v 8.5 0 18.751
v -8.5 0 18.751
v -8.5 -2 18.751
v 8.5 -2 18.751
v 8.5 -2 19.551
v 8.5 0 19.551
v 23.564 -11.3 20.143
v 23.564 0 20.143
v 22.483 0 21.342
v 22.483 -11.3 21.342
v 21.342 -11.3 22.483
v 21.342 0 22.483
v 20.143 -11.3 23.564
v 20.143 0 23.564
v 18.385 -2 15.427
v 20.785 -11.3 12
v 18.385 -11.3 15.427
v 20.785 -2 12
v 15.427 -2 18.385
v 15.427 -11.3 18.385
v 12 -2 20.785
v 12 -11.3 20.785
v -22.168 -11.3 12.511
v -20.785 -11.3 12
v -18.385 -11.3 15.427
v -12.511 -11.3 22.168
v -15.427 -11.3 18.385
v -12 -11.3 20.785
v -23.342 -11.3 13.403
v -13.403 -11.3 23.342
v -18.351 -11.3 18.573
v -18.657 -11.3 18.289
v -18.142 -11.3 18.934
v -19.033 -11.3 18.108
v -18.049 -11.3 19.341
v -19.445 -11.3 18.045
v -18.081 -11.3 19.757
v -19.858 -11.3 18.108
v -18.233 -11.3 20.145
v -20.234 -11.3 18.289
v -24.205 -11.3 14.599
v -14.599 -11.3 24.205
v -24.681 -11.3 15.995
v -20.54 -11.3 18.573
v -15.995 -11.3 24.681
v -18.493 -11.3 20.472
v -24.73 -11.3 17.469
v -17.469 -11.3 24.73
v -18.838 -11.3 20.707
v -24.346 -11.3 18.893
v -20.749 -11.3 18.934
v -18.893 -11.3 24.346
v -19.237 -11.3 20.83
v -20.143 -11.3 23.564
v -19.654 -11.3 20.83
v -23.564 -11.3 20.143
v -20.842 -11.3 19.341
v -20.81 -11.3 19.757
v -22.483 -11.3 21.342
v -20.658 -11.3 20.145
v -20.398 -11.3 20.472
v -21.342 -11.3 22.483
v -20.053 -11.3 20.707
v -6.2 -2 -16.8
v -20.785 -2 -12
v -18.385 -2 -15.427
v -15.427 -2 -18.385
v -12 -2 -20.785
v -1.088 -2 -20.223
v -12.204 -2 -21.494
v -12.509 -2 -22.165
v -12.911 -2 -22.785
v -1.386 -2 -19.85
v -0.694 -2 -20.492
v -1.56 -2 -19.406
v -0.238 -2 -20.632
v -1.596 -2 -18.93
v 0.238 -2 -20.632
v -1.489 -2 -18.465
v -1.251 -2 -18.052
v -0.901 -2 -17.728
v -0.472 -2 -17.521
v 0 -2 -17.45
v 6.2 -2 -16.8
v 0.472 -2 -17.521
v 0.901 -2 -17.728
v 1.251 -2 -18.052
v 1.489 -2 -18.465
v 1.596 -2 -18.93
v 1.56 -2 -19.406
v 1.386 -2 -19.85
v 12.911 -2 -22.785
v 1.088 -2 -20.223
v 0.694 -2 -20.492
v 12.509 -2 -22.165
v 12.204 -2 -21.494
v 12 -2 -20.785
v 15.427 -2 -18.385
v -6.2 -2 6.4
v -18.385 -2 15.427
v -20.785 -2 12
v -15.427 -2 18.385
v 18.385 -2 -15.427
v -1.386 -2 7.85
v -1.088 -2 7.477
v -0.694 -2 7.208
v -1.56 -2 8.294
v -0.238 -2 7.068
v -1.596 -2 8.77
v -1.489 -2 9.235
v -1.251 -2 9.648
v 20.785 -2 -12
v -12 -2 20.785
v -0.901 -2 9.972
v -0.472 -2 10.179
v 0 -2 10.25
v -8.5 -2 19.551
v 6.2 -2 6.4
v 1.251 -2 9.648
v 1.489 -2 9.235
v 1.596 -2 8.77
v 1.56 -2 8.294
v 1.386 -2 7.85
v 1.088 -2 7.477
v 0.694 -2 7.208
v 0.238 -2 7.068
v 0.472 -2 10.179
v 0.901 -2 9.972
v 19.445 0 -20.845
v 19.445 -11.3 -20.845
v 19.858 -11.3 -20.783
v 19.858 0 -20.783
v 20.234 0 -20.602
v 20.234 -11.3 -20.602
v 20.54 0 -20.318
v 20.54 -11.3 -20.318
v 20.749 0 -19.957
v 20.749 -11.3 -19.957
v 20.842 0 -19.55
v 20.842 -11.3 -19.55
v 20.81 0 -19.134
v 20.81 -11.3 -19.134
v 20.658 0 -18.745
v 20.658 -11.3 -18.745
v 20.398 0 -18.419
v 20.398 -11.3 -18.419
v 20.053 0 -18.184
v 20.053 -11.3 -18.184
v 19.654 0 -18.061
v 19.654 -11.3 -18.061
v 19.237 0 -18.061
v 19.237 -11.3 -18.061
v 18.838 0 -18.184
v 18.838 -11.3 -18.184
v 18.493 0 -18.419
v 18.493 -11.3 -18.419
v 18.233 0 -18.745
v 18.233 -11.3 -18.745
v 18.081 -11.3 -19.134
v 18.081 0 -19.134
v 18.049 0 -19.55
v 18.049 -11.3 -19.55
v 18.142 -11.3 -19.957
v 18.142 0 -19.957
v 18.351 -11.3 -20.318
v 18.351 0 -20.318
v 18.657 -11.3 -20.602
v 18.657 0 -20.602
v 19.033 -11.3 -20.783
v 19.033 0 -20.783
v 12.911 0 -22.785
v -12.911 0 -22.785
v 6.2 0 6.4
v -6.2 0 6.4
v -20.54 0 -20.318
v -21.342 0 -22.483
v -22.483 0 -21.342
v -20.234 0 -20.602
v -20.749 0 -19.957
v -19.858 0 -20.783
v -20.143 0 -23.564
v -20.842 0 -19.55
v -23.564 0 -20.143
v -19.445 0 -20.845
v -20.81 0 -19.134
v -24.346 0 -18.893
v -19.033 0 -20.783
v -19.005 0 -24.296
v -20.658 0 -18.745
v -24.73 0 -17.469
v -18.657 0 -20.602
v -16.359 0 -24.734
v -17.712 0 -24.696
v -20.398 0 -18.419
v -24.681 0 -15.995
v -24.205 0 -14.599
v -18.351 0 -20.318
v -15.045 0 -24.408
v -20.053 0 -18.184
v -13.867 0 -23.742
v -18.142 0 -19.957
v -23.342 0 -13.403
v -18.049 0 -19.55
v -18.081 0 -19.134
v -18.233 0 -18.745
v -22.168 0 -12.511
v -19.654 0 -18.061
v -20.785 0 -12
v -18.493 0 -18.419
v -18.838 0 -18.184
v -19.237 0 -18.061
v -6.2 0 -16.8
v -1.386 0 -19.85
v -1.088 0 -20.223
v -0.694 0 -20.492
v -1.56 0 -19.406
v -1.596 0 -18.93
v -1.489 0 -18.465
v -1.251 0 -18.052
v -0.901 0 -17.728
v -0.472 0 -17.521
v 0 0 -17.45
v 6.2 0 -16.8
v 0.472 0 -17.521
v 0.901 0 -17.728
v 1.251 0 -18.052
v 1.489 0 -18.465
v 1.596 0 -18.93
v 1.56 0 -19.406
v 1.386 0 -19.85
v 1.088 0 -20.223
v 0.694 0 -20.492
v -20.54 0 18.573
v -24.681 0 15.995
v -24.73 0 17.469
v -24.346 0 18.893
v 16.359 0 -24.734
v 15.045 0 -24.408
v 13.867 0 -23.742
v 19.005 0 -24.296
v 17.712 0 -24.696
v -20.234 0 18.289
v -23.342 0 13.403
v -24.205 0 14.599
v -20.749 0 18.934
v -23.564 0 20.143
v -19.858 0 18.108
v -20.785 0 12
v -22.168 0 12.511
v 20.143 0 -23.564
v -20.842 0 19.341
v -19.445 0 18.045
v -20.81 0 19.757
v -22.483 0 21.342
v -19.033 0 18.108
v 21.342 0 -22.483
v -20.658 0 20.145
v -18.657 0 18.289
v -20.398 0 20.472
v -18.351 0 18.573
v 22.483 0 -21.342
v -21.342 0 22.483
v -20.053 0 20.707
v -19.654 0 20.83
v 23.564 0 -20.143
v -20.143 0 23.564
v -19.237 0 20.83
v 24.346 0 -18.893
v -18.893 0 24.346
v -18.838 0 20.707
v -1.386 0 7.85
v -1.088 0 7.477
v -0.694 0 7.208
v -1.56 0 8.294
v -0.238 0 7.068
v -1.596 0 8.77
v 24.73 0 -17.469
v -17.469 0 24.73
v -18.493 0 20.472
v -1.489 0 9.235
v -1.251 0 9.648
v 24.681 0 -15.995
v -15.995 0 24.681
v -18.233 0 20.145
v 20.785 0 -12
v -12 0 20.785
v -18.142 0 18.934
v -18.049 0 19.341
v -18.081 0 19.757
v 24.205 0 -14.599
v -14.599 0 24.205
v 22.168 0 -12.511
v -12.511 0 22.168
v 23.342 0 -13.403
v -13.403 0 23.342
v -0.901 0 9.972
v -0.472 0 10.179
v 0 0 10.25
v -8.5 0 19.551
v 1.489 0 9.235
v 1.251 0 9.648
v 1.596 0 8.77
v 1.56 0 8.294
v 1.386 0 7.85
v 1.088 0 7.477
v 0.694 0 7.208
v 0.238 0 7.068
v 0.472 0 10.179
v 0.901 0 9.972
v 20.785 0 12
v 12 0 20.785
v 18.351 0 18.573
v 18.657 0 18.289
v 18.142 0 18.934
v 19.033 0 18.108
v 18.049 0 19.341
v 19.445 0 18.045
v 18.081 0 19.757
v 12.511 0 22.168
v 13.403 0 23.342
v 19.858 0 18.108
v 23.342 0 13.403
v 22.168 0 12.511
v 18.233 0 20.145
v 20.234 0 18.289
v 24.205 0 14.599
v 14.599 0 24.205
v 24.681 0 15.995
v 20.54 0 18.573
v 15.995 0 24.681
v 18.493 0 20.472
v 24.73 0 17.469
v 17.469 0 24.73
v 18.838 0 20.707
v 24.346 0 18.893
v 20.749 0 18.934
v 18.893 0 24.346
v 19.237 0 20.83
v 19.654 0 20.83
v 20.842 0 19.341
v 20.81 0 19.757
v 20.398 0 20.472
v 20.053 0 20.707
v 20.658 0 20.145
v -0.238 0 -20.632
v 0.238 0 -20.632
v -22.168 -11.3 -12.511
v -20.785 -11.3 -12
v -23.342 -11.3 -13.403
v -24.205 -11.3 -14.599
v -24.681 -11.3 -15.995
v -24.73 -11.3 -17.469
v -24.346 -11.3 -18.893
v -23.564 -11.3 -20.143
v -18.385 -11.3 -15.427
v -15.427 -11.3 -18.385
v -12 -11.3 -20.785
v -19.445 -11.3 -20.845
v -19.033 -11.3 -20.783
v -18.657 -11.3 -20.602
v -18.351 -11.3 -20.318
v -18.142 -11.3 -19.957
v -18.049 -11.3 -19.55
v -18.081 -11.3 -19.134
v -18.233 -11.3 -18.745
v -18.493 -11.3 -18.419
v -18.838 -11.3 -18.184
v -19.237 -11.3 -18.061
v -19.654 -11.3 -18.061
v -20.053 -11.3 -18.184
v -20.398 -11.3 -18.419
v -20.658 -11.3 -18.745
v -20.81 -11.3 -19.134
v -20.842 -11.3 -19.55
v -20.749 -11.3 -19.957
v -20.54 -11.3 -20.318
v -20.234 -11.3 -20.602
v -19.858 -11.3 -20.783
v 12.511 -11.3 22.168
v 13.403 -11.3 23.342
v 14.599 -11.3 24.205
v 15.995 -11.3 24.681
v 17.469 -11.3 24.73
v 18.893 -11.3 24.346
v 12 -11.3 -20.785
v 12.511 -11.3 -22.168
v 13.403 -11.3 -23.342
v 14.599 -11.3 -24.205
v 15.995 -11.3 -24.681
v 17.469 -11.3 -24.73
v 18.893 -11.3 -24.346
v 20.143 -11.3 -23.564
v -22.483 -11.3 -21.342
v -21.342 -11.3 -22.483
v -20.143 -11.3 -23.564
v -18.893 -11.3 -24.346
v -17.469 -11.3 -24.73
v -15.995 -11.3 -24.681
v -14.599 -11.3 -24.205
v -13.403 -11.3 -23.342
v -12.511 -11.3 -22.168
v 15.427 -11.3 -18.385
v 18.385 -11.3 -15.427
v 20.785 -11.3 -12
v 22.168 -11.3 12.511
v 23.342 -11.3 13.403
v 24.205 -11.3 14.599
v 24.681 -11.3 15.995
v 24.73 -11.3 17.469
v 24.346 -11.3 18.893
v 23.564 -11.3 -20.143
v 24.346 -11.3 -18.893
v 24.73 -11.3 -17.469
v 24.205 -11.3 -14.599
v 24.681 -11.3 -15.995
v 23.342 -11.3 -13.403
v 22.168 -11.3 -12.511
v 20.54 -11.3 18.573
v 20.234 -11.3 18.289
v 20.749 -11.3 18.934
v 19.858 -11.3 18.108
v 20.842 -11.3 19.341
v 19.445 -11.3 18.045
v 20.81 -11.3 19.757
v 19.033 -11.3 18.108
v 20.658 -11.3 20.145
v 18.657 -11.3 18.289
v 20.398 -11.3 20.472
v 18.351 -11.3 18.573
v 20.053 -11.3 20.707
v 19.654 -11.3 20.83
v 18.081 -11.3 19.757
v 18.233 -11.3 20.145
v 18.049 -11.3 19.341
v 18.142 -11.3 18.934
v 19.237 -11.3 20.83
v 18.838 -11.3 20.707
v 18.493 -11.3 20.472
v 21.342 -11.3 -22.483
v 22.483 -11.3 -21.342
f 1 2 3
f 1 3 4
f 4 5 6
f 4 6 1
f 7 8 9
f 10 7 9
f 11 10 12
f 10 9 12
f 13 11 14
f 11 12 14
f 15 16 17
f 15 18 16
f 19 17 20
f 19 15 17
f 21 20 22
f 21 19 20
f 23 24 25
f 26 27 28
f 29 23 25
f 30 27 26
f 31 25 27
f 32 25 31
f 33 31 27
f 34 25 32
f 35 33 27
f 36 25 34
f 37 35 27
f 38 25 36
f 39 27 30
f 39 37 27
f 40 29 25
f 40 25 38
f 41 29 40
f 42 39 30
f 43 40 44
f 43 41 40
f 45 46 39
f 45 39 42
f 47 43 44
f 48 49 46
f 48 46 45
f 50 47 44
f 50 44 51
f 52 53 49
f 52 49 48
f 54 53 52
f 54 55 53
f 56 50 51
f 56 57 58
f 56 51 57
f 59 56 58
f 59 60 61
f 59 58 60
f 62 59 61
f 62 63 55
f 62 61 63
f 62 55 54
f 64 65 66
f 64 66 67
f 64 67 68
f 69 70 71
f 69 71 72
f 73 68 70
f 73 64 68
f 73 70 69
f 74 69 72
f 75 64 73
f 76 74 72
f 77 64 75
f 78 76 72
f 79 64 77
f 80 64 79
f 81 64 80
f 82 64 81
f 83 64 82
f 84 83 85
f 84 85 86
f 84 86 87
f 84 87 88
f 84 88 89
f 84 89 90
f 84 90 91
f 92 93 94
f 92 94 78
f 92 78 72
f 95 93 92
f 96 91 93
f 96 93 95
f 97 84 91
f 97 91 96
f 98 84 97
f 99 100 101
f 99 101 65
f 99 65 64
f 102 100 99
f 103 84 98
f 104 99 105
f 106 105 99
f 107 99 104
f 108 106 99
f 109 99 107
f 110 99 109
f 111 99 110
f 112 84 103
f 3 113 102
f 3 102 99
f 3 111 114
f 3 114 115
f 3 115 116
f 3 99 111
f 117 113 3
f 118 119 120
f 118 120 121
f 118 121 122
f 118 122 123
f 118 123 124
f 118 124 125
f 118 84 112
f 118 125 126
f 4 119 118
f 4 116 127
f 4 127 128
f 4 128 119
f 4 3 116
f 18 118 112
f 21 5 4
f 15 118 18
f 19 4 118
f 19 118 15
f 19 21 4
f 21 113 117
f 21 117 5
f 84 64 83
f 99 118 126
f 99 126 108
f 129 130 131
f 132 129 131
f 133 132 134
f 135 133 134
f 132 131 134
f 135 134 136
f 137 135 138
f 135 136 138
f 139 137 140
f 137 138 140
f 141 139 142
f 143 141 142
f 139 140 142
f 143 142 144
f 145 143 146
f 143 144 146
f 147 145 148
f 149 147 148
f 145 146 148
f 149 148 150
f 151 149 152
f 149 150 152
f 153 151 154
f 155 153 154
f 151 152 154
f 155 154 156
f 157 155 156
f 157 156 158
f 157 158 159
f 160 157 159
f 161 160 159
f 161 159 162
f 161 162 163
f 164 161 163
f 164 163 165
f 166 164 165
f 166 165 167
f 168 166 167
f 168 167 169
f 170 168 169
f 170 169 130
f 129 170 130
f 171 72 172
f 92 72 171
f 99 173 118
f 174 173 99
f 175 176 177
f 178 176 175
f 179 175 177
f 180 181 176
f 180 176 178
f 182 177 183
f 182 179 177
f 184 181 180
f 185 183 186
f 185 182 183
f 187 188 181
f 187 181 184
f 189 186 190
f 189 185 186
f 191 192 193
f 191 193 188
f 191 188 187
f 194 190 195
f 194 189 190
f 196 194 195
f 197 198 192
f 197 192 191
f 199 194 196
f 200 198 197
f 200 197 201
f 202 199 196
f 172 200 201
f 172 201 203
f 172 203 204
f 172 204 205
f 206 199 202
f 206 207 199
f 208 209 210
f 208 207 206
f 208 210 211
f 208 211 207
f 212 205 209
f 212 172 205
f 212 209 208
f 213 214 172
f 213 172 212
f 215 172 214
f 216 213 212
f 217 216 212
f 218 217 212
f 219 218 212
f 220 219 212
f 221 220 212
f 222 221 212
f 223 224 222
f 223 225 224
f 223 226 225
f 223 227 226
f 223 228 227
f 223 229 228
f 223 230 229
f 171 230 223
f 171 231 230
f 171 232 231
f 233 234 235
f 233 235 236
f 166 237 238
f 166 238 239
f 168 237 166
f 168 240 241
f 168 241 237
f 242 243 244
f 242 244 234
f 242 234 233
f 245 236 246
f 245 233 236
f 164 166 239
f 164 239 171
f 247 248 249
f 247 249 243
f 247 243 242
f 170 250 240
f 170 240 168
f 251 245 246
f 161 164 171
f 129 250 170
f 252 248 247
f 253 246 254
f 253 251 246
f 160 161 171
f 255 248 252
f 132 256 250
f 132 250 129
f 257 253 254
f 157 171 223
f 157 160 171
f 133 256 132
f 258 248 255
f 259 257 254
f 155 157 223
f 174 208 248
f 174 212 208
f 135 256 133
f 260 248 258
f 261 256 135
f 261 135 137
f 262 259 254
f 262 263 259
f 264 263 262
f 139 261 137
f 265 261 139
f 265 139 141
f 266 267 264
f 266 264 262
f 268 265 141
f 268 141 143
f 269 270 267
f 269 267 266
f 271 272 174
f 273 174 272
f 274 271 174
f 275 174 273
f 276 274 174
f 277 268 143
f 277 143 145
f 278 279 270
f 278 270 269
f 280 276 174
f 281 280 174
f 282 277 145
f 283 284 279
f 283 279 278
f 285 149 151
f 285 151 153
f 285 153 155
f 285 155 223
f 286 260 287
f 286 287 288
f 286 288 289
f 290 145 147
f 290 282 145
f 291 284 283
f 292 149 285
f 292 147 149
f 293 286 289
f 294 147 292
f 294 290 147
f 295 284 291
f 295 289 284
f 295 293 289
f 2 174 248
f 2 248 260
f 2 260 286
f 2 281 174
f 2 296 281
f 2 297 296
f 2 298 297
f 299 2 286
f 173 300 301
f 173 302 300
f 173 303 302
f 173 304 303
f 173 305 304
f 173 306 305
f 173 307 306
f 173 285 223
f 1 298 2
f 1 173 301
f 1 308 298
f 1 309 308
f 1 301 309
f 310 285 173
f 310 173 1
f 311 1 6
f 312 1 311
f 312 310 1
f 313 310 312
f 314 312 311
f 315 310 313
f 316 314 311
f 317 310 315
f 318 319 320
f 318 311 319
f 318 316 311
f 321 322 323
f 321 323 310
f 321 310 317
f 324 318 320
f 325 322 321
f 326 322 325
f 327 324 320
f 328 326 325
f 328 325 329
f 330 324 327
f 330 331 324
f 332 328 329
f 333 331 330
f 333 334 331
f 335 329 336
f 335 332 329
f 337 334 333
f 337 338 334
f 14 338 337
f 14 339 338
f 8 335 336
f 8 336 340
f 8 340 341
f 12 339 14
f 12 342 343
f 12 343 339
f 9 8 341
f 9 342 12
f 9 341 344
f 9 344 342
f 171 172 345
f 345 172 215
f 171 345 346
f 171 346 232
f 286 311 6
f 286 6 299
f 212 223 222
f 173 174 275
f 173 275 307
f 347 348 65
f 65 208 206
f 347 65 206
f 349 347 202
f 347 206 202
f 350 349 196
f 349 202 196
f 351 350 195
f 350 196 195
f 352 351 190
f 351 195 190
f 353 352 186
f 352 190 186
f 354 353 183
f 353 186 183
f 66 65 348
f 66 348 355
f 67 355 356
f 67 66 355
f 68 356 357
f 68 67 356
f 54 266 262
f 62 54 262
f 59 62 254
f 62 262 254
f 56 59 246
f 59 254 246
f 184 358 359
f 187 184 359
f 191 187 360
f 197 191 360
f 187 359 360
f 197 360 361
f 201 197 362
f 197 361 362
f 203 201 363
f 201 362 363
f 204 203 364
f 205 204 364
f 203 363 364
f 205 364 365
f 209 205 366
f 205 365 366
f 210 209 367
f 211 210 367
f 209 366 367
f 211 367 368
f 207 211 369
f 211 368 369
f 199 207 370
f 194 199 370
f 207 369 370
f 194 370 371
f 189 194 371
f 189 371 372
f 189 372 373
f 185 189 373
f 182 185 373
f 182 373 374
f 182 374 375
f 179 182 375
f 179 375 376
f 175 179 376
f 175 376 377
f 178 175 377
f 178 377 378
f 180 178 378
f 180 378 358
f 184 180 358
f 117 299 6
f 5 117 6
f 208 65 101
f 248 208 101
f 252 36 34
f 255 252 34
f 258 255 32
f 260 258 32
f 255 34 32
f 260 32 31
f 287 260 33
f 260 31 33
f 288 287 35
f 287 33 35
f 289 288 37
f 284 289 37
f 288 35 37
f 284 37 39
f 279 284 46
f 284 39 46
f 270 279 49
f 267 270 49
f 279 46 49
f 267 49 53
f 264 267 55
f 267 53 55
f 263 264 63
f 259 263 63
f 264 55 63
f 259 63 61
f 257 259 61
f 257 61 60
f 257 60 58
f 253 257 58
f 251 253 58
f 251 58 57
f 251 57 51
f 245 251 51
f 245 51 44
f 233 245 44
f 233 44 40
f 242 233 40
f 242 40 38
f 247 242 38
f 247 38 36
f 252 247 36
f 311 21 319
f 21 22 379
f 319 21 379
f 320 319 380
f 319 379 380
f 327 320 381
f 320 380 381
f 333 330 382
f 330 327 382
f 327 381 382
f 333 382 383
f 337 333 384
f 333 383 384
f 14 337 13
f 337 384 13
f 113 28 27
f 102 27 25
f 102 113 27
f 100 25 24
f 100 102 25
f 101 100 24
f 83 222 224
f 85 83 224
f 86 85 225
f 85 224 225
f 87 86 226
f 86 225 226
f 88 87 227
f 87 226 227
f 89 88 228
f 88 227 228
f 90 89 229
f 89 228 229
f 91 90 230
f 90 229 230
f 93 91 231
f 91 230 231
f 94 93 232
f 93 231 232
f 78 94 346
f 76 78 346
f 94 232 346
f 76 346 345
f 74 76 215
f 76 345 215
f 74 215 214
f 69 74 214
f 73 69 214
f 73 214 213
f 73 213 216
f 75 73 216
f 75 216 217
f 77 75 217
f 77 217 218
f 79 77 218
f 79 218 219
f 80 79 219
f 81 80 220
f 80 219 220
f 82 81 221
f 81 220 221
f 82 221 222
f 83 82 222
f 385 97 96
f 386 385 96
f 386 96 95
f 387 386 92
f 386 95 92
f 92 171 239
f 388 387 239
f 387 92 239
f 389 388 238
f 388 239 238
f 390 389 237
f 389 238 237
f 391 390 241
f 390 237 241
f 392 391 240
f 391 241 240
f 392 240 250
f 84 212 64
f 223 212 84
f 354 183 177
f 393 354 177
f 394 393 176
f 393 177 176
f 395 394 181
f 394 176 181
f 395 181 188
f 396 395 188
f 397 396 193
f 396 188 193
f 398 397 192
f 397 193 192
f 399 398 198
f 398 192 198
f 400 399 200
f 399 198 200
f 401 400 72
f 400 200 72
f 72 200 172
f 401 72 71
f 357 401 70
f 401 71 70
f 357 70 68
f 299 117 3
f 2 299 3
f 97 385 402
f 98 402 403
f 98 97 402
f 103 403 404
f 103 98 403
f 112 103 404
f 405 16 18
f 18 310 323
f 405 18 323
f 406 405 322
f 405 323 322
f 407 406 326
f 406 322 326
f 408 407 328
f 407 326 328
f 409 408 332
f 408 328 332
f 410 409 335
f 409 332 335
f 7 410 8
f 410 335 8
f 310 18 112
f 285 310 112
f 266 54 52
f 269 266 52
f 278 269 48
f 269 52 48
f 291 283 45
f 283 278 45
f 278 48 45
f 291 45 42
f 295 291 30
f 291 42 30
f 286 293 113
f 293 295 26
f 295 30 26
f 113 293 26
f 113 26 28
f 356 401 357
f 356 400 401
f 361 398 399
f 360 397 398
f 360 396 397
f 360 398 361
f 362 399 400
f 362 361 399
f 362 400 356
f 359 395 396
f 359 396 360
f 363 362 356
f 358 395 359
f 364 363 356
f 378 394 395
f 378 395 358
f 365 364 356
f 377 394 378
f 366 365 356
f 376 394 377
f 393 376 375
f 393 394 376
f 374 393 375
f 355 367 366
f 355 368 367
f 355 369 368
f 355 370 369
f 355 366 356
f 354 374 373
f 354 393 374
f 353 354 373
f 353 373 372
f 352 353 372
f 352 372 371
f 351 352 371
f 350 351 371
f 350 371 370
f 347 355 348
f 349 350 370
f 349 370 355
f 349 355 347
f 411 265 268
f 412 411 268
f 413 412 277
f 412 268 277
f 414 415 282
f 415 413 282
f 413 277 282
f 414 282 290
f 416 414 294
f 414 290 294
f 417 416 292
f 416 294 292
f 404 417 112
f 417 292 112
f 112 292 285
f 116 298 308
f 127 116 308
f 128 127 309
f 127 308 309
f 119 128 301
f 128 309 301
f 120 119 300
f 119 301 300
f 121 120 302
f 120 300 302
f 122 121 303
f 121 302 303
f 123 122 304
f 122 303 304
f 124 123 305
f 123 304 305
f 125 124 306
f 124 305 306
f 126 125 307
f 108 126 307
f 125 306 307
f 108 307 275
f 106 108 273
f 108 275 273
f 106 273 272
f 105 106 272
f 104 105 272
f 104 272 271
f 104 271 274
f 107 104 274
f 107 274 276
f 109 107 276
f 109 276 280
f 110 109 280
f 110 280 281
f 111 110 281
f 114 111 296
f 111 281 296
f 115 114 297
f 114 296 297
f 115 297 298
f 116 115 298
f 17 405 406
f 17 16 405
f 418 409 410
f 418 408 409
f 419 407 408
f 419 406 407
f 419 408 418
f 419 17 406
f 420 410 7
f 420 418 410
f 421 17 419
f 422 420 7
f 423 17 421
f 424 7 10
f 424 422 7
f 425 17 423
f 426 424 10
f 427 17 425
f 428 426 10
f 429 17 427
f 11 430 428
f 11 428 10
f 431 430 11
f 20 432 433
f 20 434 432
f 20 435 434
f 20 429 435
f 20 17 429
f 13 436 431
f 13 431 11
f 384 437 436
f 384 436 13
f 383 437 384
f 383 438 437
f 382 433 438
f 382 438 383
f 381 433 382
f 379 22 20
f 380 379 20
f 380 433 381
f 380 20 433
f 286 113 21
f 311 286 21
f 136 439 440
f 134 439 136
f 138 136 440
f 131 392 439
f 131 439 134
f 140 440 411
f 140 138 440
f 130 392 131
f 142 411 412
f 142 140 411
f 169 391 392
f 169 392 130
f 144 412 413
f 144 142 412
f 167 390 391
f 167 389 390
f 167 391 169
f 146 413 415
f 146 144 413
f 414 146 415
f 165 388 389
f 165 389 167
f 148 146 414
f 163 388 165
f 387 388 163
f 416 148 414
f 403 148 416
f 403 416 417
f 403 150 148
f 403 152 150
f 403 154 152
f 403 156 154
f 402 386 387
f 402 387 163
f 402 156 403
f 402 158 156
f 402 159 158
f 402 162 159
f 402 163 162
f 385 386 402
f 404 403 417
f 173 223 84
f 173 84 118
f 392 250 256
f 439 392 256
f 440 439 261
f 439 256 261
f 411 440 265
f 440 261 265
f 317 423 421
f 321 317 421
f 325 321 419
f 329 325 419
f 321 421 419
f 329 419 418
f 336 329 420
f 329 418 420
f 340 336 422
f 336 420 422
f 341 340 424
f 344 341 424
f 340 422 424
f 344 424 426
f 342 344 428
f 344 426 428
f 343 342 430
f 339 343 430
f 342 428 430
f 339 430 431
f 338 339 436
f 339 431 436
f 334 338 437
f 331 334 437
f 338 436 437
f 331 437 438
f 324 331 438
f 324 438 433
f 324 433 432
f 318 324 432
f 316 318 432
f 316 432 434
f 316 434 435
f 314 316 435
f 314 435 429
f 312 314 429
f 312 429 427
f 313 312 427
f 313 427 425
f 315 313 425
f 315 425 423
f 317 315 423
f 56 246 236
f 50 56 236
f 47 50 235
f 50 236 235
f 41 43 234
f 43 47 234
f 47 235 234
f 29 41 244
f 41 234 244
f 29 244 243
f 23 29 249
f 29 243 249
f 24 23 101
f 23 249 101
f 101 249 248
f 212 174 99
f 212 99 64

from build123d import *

# Parameters (mm, degrees)
SKETCH3_R            = 31
SKETCH3_R_2          = 1.6
SERVO_MOUNT_DEPTH    = 2
SKETCH4_R            = 31
SKETCH4_R_2          = 24
SPACER_DEPTH         = 9.3
FLEX_CABLE_REACH     = 47.274
SKETCH5_W            = 17
SKETCH5_H            = 0.8
SKETCH7_W            = 24
SKETCH7_H            = 62
CUT_EXTRUDE3_DEPTH   = 45.816180114
SKETCH8_W            = 62
SKETCH8_H            = 24
CUT_EXTRUDE4_DEPTH   = 45.816180114
MOUNTING_HOLES_REACH = 47.274
SKETCH10_R           = 1.4
CUT_EXTRUDE5_REACH   = 46.816
FILLET2_R            = 5


with BuildPart() as part:
    # Sketch3 → Servo mount (new body)
    with BuildSketch(Plane(origin=(0, 0, 0), x_dir=(1, 0, 0), z_dir=(0, 1, 0))):
        with Locations(Location((0, 0, 0), (0, 0, 270))):
            Circle(SKETCH3_R)
        with Locations(Location((0, -8.65, 0), (0, 0, 270))):
            Circle(SKETCH3_R_2, mode=Mode.SUBTRACT)
        with Locations(Location((0, 19.05, 0), (0, 0, 270))):
            Circle(SKETCH3_R_2, mode=Mode.SUBTRACT)
        Polygon((-6.2, 16.1), (-6.2, 2.227105745), (-6.2, -6.4), (-5.7, -6.4), (5.7, -6.4), (6.2, -6.4), (6.2, 2.227105745), (6.2, 16.1), (6.2, 16.8), (5.7, 16.8), (-5.7, 16.8), (-6.2, 16.8), align=None, mode=Mode.SUBTRACT)
    extrude(amount=-SERVO_MOUNT_DEPTH)

    # Sketch4 → Spacer (add)
    with BuildSketch(Plane(origin=(0, -2, 0), x_dir=(-1, 0, 0), z_dir=(0, -1, 0))):
        with Locations(Location((0, 0, 0), (0, 0, 270))):
            Circle(SKETCH4_R)
        with Locations(Location((0, 0, 0), (0, 0, 270))):
            Circle(SKETCH4_R_2, mode=Mode.SUBTRACT)
    extrude(amount=SPACER_DEPTH)

    # Sketch5 → Flex cable (cut, up to next)
    with BuildSketch(Plane(origin=(0, 0, 0), x_dir=(1, 0, 0), z_dir=(0, 1, 0)), mode=Mode.PRIVATE) as flex_cable_sk1:
        with Locations((0, -19.15054858)):
            Rectangle(SKETCH5_W, SKETCH5_H)
    flex_cable_tool1 = extrude(flex_cable_sk1.sketch, amount=-FLEX_CABLE_REACH, mode=Mode.PRIVATE) & part.part
    add(flex_cable_tool1.solids().sort_by_distance((0, 0, 19.150549))[0], mode=Mode.SUBTRACT)

    # Sketch7 → Cut-Extrude3 (cut, through all)
    with BuildSketch(Plane.XZ.offset(2)):
        Rectangle(SKETCH7_W, SKETCH7_H)
    extrude(amount=CUT_EXTRUDE3_DEPTH, mode=Mode.SUBTRACT)

    # Sketch8 → Cut-Extrude4 (cut, through all)
    with BuildSketch(Plane.XZ.offset(2)):
        Rectangle(SKETCH8_W, SKETCH8_H)
    extrude(amount=CUT_EXTRUDE4_DEPTH, mode=Mode.SUBTRACT)

    # Sketch10 → Mounting holes (cut, up to next)
    with BuildSketch(Plane.XZ.offset(11.3), mode=Mode.PRIVATE) as mounting_holes_sk1:
        with Locations(Location((-19.445436483, -19.445436483, 0), (0, 0, 270))):
            Circle(SKETCH10_R)
    mounting_holes_tool1 = extrude(mounting_holes_sk1.sketch, amount=-MOUNTING_HOLES_REACH, mode=Mode.PRIVATE) & part.part
    # Sketch10 → Mounting holes (cut, up to next)
    with BuildSketch(Plane.XZ.offset(11.3), mode=Mode.PRIVATE) as mounting_holes_sk2:
        with Locations(Location((19.445436483, -19.445436483, 0), (0, 0, 270))):
            Circle(SKETCH10_R)
    mounting_holes_tool2 = extrude(mounting_holes_sk2.sketch, amount=-MOUNTING_HOLES_REACH, mode=Mode.PRIVATE) & part.part
    # Sketch10 → Mounting holes (cut, up to next)
    with BuildSketch(Plane.XZ.offset(11.3), mode=Mode.PRIVATE) as mounting_holes_sk3:
        with Locations(Location((-19.445436483, 19.445436483, 0), (0, 0, 270))):
            Circle(SKETCH10_R)
    mounting_holes_tool3 = extrude(mounting_holes_sk3.sketch, amount=-MOUNTING_HOLES_REACH, mode=Mode.PRIVATE) & part.part
    # Sketch10 → Mounting holes (cut, up to next)
    with BuildSketch(Plane.XZ.offset(11.3), mode=Mode.PRIVATE) as mounting_holes_sk4:
        with Locations(Location((19.445436483, 19.445436483, 0), (0, 0, 270))):
            Circle(SKETCH10_R)
    mounting_holes_tool4 = extrude(mounting_holes_sk4.sketch, amount=-MOUNTING_HOLES_REACH, mode=Mode.PRIVATE) & part.part
    add(mounting_holes_tool1.solids().sort_by_distance((-19.445436, -11.3, -19.445436))[0], mode=Mode.SUBTRACT)
    add(mounting_holes_tool2.solids().sort_by_distance((19.445436, -11.3, -19.445436))[0], mode=Mode.SUBTRACT)
    add(mounting_holes_tool3.solids().sort_by_distance((-19.445436, -11.3, 19.445436))[0], mode=Mode.SUBTRACT)
    add(mounting_holes_tool4.solids().sort_by_distance((19.445436, -11.3, 19.445436))[0], mode=Mode.SUBTRACT)

    # Sketch11 → Cut-Extrude5 (cut, up to next)
    with BuildSketch(Plane.XZ.offset(2), mode=Mode.PRIVATE) as cut_extrude5_sk1:
        with BuildLine():
            Line((-12, -22.784609691), (12, -22.784609691))
            Line((12, -22.784609691), (12, -28.583211856))
            ThreePointArc((12, -28.583211856), (0, -31), (-12, -28.583211856))
            Line((-12, -28.583211856), (-12, -22.784609691))
        make_face()
    cut_extrude5_tool1 = extrude(cut_extrude5_sk1.sketch, amount=-CUT_EXTRUDE5_REACH, mode=Mode.PRIVATE) & part.part
    # Sketch11 → Cut-Extrude5 (cut, up to next)
    with BuildSketch(Plane.XZ.offset(2), mode=Mode.PRIVATE) as cut_extrude5_sk2:
        with BuildLine():
            Line((28.583211856, 12), (20.784609691, 12))
            Line((20.784609691, 12), (20.784609691, -12))
            Line((20.784609691, -12), (28.583211856, -12))
            ThreePointArc((28.583211856, -12), (31, 0), (28.583211856, 12))
        make_face()
    cut_extrude5_tool2 = extrude(cut_extrude5_sk2.sketch, amount=-CUT_EXTRUDE5_REACH, mode=Mode.PRIVATE) & part.part
    # Sketch11 → Cut-Extrude5 (cut, up to next)
    with BuildSketch(Plane.XZ.offset(2), mode=Mode.PRIVATE) as cut_extrude5_sk3:
        with BuildLine():
            Line((-28.583211856, -12), (-20.784609691, -12))
            Line((-20.784609691, -12), (-20.784609691, 12))
            Line((-20.784609691, 12), (-28.583211856, 12))
            ThreePointArc((-28.583211856, 12), (-31, 0), (-28.583211856, -12))
        make_face()
    cut_extrude5_tool3 = extrude(cut_extrude5_sk3.sketch, amount=-CUT_EXTRUDE5_REACH, mode=Mode.PRIVATE) & part.part
    # Sketch11 → Cut-Extrude5 (cut, up to next)
    with BuildSketch(Plane.XZ.offset(2), mode=Mode.PRIVATE) as cut_extrude5_sk4:
        with BuildLine():
            Line((12, 20.784609691), (12, 28.583211856))
            ThreePointArc((12, 28.583211856), (0, 31), (-12, 28.583211856))
            Line((-12, 28.583211856), (-12, 20.784609691))
            Line((-12, 20.784609691), (12, 20.784609691))
        make_face()
    cut_extrude5_tool4 = extrude(cut_extrude5_sk4.sketch, amount=-CUT_EXTRUDE5_REACH, mode=Mode.PRIVATE) & part.part
    add(cut_extrude5_tool1.solids().sort_by_distance((0, -2, -26.530561))[0], mode=Mode.SUBTRACT)
    add(cut_extrude5_tool2.solids().sort_by_distance((25.523226, -2, 0))[0], mode=Mode.SUBTRACT)
    add(cut_extrude5_tool3.solids().sort_by_distance((-25.523226, -2, 0))[0], mode=Mode.SUBTRACT)
    add(cut_extrude5_tool4.solids().sort_by_distance((0, -2, 25.523226))[0], mode=Mode.SUBTRACT)

    # Fillet2
    # the kernel refuses this fillet: 5 mm, written as the material it takes off along each edge
    with BuildSketch(Plane(origin=(12, -35.215595033, 28.583211856), x_dir=(0.8512708603213988, -2.9625112876132807e-14, -0.5247265215020731), z_dir=(0, 1, 0))) as fillet2_piece_1:
        with BuildLine():
            CenterArc((8.794767206, 4.940124775), FILLET2_R, 160.140208495, 118.735653745)
            Line((4.092133387, 6.638722774), (0, 0))
            ThreePointArc((0, 0), (4.783119007, -0.371226395), (9.566238013, 0))
        make_face()
    extrude(amount=59.131190067, mode=Mode.SUBTRACT)
    with BuildSketch(Plane(origin=(12, 23.915595033, -28.583211856), x_dir=(0, 0, 1), z_dir=(0, -1, 0))) as fillet2_piece_2_section:
        with BuildLine():
            CenterArc((8.820231871, -4.894514557), FILLET2_R, 101.790043136, 118.735653745)
            ThreePointArc((5.019658797, -8.143459664), (2.193815186, -4.266522167), (0, 0))
            Line((0, 0), (7.798602165, 0))
        make_face()
    fillet2_piece_2 = extrude(amount=59.131190067, mode=Mode.PRIVATE)
    fillet2_piece_2 = split(fillet2_piece_2, bisect_by=Plane(origin=(16.358047436, -1, -22.784609691), z_dir=(0, 0, -1)), keep=Keep.TOP, mode=Mode.PRIVATE)
    add(fillet2_piece_2, mode=Mode.SUBTRACT)
    with BuildSketch(Plane(origin=(12, 23.915595033, -28.583211856), x_dir=(0, 0, 1), z_dir=(0, -1, 0))) as fillet2_piece_3_section:
        with BuildLine():
            CenterArc((8.820231871, -4.894514557), FILLET2_R, 101.790043136, 118.735653745)
            ThreePointArc((5.019658797, -8.143459664), (2.193815186, -4.266522167), (0, 0))
            Line((0, 0), (7.798602165, 0))
        make_face()
    fillet2_piece_3 = extrude(amount=59.131190067, mode=Mode.PRIVATE)
    fillet2_piece_3 = split(fillet2_piece_3, bisect_by=Plane(origin=(12.335072, -2, -21.839415291), z_dir=(0, -1, 0)), keep=Keep.TOP, mode=Mode.PRIVATE)
    add(fillet2_piece_3, mode=Mode.SUBTRACT)
    with BuildSketch(Plane(origin=(28.583211856, 23.915595033, -12), x_dir=(-1, 0, 0), z_dir=(0, -1, 0))) as fillet2_piece_4:
        with BuildLine():
            CenterArc((8.820231871, 4.894514557), FILLET2_R, 139.474303119, 118.735653745)
            ThreePointArc((5.019658797, 8.143459664), (2.193815186, 4.266522167), (0, 0))
            Line((0, 0), (7.798602165, 0))
        make_face()
    extrude(amount=59.131190067, mode=Mode.SUBTRACT)
    with BuildSketch(Plane(origin=(-28.583211856, 23.915595033, -12), x_dir=(1, 0, 0), z_dir=(0, -1, 0)), Plane(origin=(28.583211856, 23.915595033, 12), x_dir=(-1, 0, 0), z_dir=(0, -1, 0))) as fillet2_piece_5:
        with BuildLine():
            CenterArc((8.820231871, -4.894514557), FILLET2_R, 101.790043136, 118.735653745)
            ThreePointArc((5.019658797, -8.143459664), (2.193815186, -4.266522167), (0, 0))
            Line((0, 0), (7.798602165, 0))
        make_face()
    extrude(amount=59.131190067, mode=Mode.SUBTRACT)
    with BuildSketch(Plane(origin=(-28.583211856, 23.915595033, 12), x_dir=(0.5247265215020732, -2.488832337515826e-14, 0.8512708603213986), z_dir=(0, -1, 0)), Plane(origin=(-12, -35.215595033, 28.583211856), x_dir=(-0.8512708603213989, -3.062415803150537e-14, -0.524726521502073), z_dir=(0, 1, 0))) as fillet2_piece_6:
        with BuildLine():
            CenterArc((8.794767206, -4.940124775), FILLET2_R, 81.12413776, 118.735653745)
            Line((4.092133387, -6.638722774), (0, 0))
            ThreePointArc((0, 0), (4.783119007, 0.371226395), (9.566238013, 0))
        make_face()
    extrude(amount=59.131190067, mode=Mode.SUBTRACT)
    with BuildSketch(Plane(origin=(-12, 23.915595033, -28.583211856), x_dir=(-0.8512708603213988, 1.214076701840839e-14, 0.5247265215020731), z_dir=(0, -1, 0))) as fillet2_piece_7_section:
        with BuildLine():
            CenterArc((8.794767206, -4.940124775), FILLET2_R, 81.12413776, 118.735653745)
            Line((4.092133387, -6.638722774), (0, 0))
            ThreePointArc((0, 0), (4.783119007, 0.371226395), (9.566238013, 0))
        make_face()
    fillet2_piece_7 = extrude(amount=59.131190067, mode=Mode.PRIVATE)
    fillet2_piece_7 = split(fillet2_piece_7, bisect_by=Plane(origin=(-16.358047436, -1, -22.784609691), z_dir=(0, 0, -1)), keep=Keep.TOP, mode=Mode.PRIVATE)
    add(fillet2_piece_7, mode=Mode.SUBTRACT)
    with BuildSketch(Plane(origin=(-12, 23.915595033, -28.583211856), x_dir=(-0.8512708603213988, 1.214076701840839e-14, 0.5247265215020731), z_dir=(0, -1, 0))) as fillet2_piece_8_section:
        with BuildLine():
            CenterArc((8.794767206, -4.940124775), FILLET2_R, 81.12413776, 118.735653745)
            Line((4.092133387, -6.638722774), (0, 0))
            ThreePointArc((0, 0), (4.783119007, 0.371226395), (9.566238013, 0))
        make_face()
    fillet2_piece_8 = extrude(amount=59.131190067, mode=Mode.PRIVATE)
    fillet2_piece_8 = split(fillet2_piece_8, bisect_by=Plane(origin=(-12.335072, -2, -21.839415291), z_dir=(0, -1, 0)), keep=Keep.TOP, mode=Mode.PRIVATE)
    add(fillet2_piece_8, mode=Mode.SUBTRACT)


solid = part.part
